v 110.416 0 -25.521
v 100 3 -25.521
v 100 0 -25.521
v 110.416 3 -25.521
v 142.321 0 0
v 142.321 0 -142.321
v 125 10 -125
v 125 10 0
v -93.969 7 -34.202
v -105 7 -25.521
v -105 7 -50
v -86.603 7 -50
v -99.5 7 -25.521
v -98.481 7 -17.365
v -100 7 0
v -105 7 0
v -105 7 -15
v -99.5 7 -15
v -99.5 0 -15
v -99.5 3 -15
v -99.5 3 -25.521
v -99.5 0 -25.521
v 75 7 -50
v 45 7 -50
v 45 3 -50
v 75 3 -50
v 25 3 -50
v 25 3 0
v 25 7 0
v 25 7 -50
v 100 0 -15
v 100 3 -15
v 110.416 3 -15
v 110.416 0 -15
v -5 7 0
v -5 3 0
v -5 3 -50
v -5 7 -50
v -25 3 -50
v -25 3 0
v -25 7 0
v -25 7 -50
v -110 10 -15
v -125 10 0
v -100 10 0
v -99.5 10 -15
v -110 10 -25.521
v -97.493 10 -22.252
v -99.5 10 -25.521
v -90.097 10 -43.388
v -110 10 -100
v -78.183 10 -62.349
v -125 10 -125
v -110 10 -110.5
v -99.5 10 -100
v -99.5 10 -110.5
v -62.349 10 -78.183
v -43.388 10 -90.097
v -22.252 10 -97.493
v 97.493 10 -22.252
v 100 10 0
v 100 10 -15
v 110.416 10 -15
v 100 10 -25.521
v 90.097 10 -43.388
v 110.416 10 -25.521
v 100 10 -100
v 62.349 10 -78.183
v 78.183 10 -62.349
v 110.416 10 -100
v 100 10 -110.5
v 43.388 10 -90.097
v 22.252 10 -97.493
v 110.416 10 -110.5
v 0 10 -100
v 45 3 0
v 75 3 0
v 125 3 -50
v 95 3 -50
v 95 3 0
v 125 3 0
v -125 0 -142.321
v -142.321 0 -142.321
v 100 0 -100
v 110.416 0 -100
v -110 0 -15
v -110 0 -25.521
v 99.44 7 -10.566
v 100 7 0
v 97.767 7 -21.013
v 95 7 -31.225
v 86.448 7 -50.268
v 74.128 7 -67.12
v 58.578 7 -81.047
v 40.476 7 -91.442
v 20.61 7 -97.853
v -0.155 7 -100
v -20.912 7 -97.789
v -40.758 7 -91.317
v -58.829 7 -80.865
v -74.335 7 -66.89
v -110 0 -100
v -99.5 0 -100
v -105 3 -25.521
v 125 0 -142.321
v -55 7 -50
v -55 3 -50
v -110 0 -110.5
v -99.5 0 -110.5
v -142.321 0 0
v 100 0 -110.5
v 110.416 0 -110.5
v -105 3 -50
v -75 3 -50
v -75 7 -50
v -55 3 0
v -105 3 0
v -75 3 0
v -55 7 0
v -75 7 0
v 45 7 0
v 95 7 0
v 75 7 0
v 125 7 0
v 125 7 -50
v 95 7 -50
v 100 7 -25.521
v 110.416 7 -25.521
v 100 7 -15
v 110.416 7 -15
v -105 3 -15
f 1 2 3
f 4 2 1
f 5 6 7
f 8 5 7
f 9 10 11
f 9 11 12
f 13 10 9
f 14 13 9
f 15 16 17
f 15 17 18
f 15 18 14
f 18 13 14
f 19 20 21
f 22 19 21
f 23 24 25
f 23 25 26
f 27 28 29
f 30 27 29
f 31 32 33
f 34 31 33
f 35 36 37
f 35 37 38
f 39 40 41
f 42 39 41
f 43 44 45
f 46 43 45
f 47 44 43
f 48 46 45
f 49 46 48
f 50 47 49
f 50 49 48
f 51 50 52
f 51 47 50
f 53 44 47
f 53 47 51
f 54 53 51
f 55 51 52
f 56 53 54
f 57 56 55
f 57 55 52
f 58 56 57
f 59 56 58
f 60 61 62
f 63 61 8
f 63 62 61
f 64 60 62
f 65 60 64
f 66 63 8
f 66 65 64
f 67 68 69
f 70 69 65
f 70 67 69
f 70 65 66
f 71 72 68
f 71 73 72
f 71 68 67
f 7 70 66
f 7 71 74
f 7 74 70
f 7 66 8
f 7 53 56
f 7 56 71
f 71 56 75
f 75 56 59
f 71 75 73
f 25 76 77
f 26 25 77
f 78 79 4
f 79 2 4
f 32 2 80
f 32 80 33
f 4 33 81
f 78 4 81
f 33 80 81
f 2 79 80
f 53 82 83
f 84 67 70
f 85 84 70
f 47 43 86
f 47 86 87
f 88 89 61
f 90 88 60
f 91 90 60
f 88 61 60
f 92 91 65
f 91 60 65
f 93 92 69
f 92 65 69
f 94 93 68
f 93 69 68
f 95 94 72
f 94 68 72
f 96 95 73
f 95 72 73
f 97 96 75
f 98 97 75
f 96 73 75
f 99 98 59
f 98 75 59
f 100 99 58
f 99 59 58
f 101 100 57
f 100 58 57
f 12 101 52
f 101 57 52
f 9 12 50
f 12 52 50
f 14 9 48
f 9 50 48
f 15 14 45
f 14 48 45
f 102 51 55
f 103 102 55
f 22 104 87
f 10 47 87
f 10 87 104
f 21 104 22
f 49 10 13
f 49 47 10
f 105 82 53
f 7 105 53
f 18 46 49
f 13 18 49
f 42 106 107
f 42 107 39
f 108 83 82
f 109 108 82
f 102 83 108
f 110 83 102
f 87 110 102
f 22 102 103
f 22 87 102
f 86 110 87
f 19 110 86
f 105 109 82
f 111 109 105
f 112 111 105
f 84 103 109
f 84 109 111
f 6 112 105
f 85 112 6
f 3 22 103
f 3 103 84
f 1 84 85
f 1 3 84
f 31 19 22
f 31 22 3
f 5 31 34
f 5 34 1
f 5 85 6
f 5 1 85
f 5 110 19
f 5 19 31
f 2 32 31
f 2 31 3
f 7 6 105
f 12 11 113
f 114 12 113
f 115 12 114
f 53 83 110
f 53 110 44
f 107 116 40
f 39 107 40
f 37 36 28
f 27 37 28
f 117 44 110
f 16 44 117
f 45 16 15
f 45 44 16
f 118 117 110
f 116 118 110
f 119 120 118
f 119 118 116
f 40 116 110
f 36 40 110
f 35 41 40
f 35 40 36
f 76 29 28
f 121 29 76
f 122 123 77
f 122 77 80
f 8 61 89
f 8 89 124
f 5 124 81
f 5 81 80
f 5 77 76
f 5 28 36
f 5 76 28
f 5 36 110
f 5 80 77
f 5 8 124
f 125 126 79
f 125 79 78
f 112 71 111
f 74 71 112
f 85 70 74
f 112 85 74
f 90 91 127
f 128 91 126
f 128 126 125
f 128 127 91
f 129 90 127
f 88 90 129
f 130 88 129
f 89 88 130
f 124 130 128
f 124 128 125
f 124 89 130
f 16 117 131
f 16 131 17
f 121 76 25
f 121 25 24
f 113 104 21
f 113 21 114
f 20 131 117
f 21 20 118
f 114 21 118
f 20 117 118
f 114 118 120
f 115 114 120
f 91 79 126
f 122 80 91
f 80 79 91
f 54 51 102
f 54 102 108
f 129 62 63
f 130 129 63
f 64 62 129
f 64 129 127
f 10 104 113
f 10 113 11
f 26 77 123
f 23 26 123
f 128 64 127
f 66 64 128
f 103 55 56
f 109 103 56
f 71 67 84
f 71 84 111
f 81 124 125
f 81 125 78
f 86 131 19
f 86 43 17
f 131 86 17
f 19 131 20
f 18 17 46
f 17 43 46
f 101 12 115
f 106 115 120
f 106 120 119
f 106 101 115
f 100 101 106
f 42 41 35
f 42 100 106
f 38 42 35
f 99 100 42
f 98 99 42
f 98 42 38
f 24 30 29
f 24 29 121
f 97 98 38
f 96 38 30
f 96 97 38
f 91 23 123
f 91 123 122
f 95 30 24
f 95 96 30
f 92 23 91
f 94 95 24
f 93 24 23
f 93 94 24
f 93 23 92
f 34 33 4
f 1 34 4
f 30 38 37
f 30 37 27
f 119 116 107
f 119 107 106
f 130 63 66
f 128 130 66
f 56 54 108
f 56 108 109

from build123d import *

# Parameters (mm, degrees)
SKETCH_1_W          = 250
SKETCH_1_H          = 125
EXTRUDE_1_DEPTH     = 10
SKETCH_5_W          = 10
SKETCH_5_H          = 10
CUT_EXTRUDE_1_DEPTH = 10
CUT_EXTRUDE_2_DEPTH = 3
SKETCH_7_W          = 30
SKETCH_7_H          = 4
CUT_EXTRUDE_3_DEPTH = 50
EXTRUDE_3_DEPTH     = 250
EXTRUDE_4_REACH     = 191.684
SKETCH_11_W         = 10.5
SKETCH_11_H         = 10.5
SKETCH_11_H_2       = 10.520913438
SKETCH_11_W_2       = 10.415866522
CUT_EXTRUDE_4_DEPTH = 202.519860157


with BuildPart() as part:
    # 草图1 → 凸台-拉伸1 (new body)
    with BuildSketch(Plane(origin=(0, 0, 0), x_dir=(1, 0, 0), z_dir=(0, 1, 0))):
        with Locations((0, 62.5)):
            Rectangle(SKETCH_1_W, SKETCH_1_H)
    extrude(amount=EXTRUDE_1_DEPTH)

    # 草图5 → 切除-拉伸1 (cut)
    with BuildSketch(Plane(origin=(0, 10, 0), x_dir=(1, 0, 0), z_dir=(0, 1, 0))):
        with Locations((-105, 105)):
            Rectangle(SKETCH_5_W, SKETCH_5_H)
        with Locations((-105, 20)):
            Rectangle(SKETCH_5_W, SKETCH_5_H)
        with Locations((105, 105)):
            Rectangle(SKETCH_5_W, SKETCH_5_H)
        with Locations((105, 20)):
            Rectangle(SKETCH_5_W, SKETCH_5_H)
    extrude(amount=-CUT_EXTRUDE_1_DEPTH, mode=Mode.SUBTRACT)

    # 草图6 → 切除-拉伸2 (cut)
    with BuildSketch(Plane(origin=(0, 10, 0), x_dir=(1, 0, 0), z_dir=(0, 1, 0))):
        with BuildLine():
            Line((-100, 0), (100, 0))
            ThreePointArc((100, 0), (0, 100), (-100, 0))
        make_face()
    extrude(amount=-CUT_EXTRUDE_2_DEPTH, mode=Mode.SUBTRACT)

    # 草图7 → 切除-拉伸3 (cut)
    with BuildSketch(Plane.XY):
        with Locations((-90, 5)):
            Rectangle(SKETCH_7_W, SKETCH_7_H)
        with Locations((-40, 5)):
            Rectangle(SKETCH_7_W, SKETCH_7_H)
        with Locations((10, 5)):
            Rectangle(SKETCH_7_W, SKETCH_7_H)
        with Locations((60, 5)):
            Rectangle(SKETCH_7_W, SKETCH_7_H)
        with Locations((110, 5)):
            Rectangle(SKETCH_7_W, SKETCH_7_H)
    extrude(amount=-CUT_EXTRUDE_3_DEPTH, mode=Mode.SUBTRACT)

    # 草图8 → 凸台-拉伸3 (add)
    with BuildSketch(Plane.ZY.offset(125)):
        Polygon((-125, 10), (-125, 0), (-142.320508076, 0), align=None)
    extrude(amount=-EXTRUDE_3_DEPTH)

    # 凸台-拉伸4: up to this plane
    extrude_4_end = Plane(origin=(145, 0, -142.320508076), z_dir=(0, 0.8660254037844419, -0.4999999999999944))
    # 草图9 → 凸台-拉伸4 (add, up to the surface)
    with BuildSketch(Plane.XY, mode=Mode.PRIVATE) as extrude_4_sk1:
        Polygon((-125, 10), (-125, 0), (-142.320508076, 0), align=None)
    extrude_4_tool1 = split(extrude(extrude_4_sk1.sketch, amount=-EXTRUDE_4_REACH, mode=Mode.PRIVATE), bisect_by=extrude_4_end, keep=Keep.BOTH, mode=Mode.PRIVATE)
    add(extrude_4_tool1.solids().sort_by_distance((-130.773503, 3.333333, 0))[0])
    # 草图9 → 凸台-拉伸4 (add, up to the surface)
    with BuildSketch(Plane.XY, mode=Mode.PRIVATE) as extrude_4_sk2:
        Polygon((125, 10), (125, 0), (142.320508076, 0), align=None)
    extrude_4_tool2 = split(extrude(extrude_4_sk2.sketch, amount=-EXTRUDE_4_REACH, mode=Mode.PRIVATE), bisect_by=extrude_4_end, keep=Keep.BOTH, mode=Mode.PRIVATE)
    add(extrude_4_tool2.solids().sort_by_distance((130.773503, 3.333333, 0))[0])

    # 草图11 → 切除-拉伸4 (cut, through all)
    with BuildSketch(Plane(origin=(0, 10, 0), x_dir=(1, 0, 0), z_dir=(0, 1, 0))):
        with Locations((-104.75, 105.25)):
            Rectangle(SKETCH_11_W, SKETCH_11_H)
        with Locations((-104.75, 20.260456719)):
            Rectangle(SKETCH_11_W, SKETCH_11_H_2)
        with Locations((105.207933261, 20.260456719)):
            Rectangle(SKETCH_11_W_2, SKETCH_11_H_2)
        with Locations((105.207933261, 105.25)):
            Rectangle(SKETCH_11_W_2, SKETCH_11_H)
    extrude(amount=-CUT_EXTRUDE_4_DEPTH, mode=Mode.SUBTRACT)


solid = part.part
